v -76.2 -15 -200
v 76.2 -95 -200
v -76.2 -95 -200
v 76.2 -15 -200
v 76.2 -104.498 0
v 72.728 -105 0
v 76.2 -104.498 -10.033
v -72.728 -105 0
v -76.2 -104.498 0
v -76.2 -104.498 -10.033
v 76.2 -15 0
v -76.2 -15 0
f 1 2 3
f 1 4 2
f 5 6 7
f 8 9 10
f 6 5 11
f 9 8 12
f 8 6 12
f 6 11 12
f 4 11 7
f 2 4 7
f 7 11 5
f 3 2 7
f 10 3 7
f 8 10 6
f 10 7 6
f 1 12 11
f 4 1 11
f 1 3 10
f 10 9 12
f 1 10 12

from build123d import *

# Parameters (mm, degrees)
BOSS_EXTRUDE1_DEPTH     = 200
CUT_EXTRUDE1_DEPTH      = 77.2000001
CUT_EXTRUDE1_DEPTH_BACK = 77.2000001


with BuildPart() as part:
    # Sketch17 → Boss-Extrude1 (new body)
    with BuildSketch(Plane.XY):
        with BuildLine():
            Line((-76.2, -15), (76.2, -15))
            Line((76.2, -15), (76.2, -104.498366301))
            add(Edge.make_bspline(
                [(-76.2, -104.498366301), (0, -115.791283906), (76.2, -104.498366301)],
                knots=[1.253188337, 1.253188337, 1.253188337, 1.888404317, 1.888404317, 1.888404317], degree=2, weights=[1, 0.949985148, 1]))
            Line((-76.2, -104.498366301), (-76.2, -15))
        make_face()
    extrude(amount=-BOSS_EXTRUDE1_DEPTH)

    # Sketch15 → Cut-Extrude1 (cut, two sides)
    with BuildSketch(Plane(origin=(0, 0, 0), x_dir=(0, 0, -1), z_dir=(1, 0, 0))) as cut_extrude1_sk:
        Polygon((0, -110), (200, -110), (200, -95), (0, -105), align=None)
    extrude(amount=CUT_EXTRUDE1_DEPTH, mode=Mode.SUBTRACT)
    extrude(cut_extrude1_sk.sketch, amount=-CUT_EXTRUDE1_DEPTH_BACK, mode=Mode.SUBTRACT)


solid = part.part
